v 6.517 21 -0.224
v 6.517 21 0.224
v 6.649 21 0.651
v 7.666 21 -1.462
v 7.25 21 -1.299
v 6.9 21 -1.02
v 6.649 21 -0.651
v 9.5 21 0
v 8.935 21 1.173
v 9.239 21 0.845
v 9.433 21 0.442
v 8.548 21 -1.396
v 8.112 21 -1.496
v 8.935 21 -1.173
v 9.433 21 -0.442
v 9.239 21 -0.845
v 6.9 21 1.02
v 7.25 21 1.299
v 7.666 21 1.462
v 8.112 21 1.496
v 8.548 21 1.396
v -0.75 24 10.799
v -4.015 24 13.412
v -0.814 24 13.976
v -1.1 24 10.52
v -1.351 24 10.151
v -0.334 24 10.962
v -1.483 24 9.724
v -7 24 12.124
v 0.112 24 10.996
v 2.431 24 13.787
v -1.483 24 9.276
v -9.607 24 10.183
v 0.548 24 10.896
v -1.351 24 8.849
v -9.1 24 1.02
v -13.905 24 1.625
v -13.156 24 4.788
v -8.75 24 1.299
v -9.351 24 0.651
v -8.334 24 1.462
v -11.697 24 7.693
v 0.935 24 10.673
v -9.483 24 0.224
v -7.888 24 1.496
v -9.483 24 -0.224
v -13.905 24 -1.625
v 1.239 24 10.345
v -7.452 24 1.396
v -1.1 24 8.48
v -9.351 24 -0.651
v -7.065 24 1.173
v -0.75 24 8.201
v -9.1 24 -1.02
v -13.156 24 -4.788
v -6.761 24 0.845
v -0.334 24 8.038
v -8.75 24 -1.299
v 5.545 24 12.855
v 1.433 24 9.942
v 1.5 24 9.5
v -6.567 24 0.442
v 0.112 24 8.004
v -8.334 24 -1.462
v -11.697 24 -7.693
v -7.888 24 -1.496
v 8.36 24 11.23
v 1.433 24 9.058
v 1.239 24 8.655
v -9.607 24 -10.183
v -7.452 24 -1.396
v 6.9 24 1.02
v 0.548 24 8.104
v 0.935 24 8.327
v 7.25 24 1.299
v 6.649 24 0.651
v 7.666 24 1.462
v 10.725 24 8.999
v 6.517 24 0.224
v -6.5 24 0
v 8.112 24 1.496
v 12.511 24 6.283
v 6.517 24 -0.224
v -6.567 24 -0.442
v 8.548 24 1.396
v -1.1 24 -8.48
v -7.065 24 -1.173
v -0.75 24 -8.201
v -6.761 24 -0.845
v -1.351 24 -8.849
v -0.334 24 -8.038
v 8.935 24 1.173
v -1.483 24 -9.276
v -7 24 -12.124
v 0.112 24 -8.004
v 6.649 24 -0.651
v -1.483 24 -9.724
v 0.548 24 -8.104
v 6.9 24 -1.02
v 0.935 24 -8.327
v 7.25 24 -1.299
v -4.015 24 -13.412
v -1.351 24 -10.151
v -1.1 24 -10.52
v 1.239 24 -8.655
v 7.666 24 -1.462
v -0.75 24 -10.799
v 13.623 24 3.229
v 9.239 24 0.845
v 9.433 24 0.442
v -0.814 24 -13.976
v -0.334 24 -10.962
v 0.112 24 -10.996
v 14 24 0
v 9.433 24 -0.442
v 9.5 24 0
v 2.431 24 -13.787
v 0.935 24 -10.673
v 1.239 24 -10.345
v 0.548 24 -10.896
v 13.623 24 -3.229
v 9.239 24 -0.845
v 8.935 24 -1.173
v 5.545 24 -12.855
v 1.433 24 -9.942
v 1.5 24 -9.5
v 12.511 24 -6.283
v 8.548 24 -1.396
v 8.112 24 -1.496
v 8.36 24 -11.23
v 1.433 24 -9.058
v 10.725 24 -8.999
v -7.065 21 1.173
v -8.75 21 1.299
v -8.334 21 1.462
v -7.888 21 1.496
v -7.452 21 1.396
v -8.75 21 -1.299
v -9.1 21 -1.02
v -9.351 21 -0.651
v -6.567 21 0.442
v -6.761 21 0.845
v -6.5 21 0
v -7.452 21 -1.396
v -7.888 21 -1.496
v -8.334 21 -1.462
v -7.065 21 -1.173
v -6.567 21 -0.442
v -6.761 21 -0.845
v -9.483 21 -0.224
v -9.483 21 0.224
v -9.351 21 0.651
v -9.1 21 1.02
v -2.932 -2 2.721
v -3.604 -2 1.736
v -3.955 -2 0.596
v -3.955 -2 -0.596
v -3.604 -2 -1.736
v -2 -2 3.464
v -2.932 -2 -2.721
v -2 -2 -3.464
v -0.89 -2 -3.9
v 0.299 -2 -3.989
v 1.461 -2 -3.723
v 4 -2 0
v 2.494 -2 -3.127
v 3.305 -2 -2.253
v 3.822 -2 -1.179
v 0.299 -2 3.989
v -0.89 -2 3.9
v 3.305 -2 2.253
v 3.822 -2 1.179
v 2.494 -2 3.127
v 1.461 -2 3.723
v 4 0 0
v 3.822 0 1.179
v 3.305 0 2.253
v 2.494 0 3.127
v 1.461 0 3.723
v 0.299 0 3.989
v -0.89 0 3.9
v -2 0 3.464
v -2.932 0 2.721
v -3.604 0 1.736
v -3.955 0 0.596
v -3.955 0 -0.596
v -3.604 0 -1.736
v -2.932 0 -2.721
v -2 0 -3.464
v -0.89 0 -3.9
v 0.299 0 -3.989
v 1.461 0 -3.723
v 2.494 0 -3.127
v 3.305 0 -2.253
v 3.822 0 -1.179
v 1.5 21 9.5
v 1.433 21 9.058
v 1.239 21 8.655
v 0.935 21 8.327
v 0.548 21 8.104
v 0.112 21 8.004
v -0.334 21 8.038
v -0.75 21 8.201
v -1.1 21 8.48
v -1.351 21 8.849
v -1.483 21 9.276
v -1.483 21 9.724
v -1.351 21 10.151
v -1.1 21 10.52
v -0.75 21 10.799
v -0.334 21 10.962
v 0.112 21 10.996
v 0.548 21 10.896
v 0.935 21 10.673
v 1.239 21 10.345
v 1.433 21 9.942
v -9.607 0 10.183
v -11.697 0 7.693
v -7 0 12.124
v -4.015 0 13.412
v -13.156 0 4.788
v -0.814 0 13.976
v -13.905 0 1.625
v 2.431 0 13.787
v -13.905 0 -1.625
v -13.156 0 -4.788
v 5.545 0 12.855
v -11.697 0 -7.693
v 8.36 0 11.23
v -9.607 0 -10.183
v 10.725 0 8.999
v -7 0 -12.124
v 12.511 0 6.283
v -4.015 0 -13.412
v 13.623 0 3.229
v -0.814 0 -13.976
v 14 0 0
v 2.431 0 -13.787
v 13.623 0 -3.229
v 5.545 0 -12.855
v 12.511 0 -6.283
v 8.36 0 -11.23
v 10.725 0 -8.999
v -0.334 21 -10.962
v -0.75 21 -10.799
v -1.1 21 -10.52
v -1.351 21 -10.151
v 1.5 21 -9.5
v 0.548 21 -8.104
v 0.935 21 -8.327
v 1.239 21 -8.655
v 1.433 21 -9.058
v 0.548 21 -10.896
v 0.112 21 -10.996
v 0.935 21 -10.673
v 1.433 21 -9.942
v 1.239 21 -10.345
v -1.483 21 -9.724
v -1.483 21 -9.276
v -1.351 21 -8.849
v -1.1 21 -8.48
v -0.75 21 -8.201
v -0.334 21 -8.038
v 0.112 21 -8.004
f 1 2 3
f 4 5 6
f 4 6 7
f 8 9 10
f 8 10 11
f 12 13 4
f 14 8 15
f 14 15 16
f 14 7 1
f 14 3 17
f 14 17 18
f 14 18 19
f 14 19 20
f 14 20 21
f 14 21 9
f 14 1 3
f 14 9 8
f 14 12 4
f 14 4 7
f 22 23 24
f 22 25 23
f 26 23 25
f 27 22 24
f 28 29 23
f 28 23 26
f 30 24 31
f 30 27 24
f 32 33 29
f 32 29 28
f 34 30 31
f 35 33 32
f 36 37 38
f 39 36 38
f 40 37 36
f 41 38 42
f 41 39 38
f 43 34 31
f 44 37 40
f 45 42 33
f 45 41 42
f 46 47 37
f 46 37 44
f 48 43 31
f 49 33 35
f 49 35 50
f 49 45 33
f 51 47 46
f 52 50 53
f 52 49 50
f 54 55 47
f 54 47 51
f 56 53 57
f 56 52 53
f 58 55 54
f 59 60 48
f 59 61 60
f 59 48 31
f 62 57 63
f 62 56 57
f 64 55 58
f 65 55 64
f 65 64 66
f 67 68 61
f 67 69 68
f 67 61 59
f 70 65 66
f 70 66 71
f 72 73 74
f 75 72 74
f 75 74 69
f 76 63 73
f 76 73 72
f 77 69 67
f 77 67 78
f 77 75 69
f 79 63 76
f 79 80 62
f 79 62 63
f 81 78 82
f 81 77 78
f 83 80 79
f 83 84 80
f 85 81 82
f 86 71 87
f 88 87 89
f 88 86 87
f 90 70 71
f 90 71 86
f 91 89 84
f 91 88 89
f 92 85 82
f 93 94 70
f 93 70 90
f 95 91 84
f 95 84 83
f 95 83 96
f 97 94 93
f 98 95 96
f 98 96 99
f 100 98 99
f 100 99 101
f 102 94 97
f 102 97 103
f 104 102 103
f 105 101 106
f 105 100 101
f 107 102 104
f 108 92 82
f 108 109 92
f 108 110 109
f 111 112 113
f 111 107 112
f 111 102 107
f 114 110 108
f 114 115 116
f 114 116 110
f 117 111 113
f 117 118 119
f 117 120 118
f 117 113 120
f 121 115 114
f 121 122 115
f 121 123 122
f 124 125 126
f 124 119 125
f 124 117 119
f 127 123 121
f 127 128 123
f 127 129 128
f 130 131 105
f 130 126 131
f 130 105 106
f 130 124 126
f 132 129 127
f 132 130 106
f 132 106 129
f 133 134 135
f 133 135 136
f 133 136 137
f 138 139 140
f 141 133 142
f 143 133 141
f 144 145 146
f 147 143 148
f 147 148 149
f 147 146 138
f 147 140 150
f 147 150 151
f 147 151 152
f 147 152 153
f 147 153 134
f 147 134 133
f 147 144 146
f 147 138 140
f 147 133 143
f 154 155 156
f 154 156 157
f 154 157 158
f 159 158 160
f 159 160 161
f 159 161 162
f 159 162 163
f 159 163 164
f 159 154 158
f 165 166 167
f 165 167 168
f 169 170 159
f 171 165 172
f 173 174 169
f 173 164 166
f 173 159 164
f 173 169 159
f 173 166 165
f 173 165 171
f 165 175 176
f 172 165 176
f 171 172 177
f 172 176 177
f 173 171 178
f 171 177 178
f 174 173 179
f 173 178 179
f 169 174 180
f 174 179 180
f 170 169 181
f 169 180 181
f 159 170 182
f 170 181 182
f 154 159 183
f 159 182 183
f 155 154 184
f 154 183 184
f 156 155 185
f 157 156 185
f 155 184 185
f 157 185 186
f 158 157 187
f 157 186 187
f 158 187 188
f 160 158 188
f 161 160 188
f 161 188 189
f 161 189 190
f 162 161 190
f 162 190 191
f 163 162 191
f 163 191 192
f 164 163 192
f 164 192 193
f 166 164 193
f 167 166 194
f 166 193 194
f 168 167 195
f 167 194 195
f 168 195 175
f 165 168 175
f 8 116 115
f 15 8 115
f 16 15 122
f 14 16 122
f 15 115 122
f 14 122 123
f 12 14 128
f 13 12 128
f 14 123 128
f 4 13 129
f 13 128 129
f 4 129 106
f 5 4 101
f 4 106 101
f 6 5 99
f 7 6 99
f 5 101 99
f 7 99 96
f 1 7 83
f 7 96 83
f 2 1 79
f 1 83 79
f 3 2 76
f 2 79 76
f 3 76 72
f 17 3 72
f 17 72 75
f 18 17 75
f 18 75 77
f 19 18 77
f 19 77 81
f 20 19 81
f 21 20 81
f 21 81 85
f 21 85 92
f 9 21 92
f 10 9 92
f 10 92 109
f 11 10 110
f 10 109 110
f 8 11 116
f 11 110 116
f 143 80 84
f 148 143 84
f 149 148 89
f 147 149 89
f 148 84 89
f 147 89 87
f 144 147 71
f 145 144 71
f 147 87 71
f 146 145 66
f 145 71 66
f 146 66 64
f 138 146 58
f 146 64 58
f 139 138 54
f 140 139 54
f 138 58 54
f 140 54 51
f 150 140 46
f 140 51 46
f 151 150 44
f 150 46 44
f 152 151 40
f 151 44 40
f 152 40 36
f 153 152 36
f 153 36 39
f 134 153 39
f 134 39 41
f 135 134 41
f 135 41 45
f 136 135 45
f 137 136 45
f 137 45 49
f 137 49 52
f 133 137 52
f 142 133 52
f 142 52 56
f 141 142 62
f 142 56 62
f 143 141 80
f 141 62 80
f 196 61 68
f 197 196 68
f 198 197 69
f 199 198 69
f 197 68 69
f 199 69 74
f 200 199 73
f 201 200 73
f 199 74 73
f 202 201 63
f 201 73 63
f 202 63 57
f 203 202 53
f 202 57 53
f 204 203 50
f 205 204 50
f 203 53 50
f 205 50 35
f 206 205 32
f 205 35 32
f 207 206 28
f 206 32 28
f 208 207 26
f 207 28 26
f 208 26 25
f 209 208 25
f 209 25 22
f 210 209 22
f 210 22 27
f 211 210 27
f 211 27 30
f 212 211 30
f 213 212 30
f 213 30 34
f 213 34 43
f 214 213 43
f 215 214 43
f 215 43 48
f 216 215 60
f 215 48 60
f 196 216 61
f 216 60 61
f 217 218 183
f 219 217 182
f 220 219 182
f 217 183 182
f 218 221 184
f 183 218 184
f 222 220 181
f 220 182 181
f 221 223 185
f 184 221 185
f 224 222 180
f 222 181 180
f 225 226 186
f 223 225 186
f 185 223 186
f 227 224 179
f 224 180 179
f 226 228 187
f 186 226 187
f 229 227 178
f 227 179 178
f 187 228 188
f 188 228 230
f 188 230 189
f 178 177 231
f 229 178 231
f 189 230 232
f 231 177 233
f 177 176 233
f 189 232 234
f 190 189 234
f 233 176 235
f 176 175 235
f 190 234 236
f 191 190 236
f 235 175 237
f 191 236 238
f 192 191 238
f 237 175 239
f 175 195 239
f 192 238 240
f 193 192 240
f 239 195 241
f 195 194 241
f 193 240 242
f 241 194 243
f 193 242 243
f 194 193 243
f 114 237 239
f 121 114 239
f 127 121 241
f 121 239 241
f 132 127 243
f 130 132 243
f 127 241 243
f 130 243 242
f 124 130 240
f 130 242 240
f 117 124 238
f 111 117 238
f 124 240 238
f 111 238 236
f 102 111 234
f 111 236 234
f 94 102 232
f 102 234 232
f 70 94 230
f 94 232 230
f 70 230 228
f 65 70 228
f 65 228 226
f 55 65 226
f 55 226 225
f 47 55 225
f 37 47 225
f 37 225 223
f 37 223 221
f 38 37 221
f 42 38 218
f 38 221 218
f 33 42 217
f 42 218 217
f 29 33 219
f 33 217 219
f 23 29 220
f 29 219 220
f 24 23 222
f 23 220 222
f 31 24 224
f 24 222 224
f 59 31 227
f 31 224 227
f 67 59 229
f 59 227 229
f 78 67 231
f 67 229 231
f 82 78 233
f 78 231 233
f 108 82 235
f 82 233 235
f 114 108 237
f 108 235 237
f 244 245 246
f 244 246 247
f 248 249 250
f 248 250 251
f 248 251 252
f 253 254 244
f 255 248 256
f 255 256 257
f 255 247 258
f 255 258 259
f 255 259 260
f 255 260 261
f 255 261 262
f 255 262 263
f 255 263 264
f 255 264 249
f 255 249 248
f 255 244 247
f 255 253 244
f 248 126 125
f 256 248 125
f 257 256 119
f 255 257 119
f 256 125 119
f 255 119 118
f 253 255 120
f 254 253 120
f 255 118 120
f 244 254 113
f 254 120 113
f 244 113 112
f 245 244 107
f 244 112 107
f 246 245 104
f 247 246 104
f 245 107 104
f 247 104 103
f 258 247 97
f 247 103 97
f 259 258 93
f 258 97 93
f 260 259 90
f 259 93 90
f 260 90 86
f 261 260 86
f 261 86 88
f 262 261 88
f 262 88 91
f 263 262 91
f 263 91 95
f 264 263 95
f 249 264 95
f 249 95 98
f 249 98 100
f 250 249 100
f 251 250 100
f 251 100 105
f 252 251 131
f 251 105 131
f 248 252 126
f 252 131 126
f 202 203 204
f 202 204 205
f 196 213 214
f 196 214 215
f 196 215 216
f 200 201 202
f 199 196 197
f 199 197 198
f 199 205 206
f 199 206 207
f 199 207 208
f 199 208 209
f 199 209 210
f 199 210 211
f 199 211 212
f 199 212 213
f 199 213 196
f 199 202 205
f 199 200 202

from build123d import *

# Parameters (mm, degrees)
SKETCH1_R           = 14
BOSS_EXTRUDE1_DEPTH = 24
SKETCH2_R           = 1.5
CUT_EXTRUDE1_DEPTH  = 3
SKETCH3_R           = 4
BOSS_EXTRUDE2_DEPTH = 2


with BuildPart() as part:
    # Sketch1 → Boss-Extrude1 (new body)
    with BuildSketch(Plane(origin=(0, 0, 0), x_dir=(1, 0, 0), z_dir=(0, 1, 0))):
        Circle(SKETCH1_R)
    extrude(amount=BOSS_EXTRUDE1_DEPTH)

    # Sketch2 → Cut-Extrude1 (cut)
    with BuildSketch(Plane(origin=(0, 24, 0), x_dir=(1, 0, 0), z_dir=(0, 1, 0))):
        with Locations((8, 0)):
            Circle(SKETCH2_R)
        with Locations((0, 9.5)):
            Circle(SKETCH2_R)
        with Locations((-8, 0)):
            Circle(SKETCH2_R)
        with Locations((0, -9.5)):
            Circle(SKETCH2_R)
    extrude(amount=-CUT_EXTRUDE1_DEPTH, mode=Mode.SUBTRACT)

    # Sketch3 → Boss-Extrude2 (add)
    with BuildSketch(Plane.XZ):
        Circle(SKETCH3_R)
    extrude(amount=BOSS_EXTRUDE2_DEPTH)


solid = part.part
